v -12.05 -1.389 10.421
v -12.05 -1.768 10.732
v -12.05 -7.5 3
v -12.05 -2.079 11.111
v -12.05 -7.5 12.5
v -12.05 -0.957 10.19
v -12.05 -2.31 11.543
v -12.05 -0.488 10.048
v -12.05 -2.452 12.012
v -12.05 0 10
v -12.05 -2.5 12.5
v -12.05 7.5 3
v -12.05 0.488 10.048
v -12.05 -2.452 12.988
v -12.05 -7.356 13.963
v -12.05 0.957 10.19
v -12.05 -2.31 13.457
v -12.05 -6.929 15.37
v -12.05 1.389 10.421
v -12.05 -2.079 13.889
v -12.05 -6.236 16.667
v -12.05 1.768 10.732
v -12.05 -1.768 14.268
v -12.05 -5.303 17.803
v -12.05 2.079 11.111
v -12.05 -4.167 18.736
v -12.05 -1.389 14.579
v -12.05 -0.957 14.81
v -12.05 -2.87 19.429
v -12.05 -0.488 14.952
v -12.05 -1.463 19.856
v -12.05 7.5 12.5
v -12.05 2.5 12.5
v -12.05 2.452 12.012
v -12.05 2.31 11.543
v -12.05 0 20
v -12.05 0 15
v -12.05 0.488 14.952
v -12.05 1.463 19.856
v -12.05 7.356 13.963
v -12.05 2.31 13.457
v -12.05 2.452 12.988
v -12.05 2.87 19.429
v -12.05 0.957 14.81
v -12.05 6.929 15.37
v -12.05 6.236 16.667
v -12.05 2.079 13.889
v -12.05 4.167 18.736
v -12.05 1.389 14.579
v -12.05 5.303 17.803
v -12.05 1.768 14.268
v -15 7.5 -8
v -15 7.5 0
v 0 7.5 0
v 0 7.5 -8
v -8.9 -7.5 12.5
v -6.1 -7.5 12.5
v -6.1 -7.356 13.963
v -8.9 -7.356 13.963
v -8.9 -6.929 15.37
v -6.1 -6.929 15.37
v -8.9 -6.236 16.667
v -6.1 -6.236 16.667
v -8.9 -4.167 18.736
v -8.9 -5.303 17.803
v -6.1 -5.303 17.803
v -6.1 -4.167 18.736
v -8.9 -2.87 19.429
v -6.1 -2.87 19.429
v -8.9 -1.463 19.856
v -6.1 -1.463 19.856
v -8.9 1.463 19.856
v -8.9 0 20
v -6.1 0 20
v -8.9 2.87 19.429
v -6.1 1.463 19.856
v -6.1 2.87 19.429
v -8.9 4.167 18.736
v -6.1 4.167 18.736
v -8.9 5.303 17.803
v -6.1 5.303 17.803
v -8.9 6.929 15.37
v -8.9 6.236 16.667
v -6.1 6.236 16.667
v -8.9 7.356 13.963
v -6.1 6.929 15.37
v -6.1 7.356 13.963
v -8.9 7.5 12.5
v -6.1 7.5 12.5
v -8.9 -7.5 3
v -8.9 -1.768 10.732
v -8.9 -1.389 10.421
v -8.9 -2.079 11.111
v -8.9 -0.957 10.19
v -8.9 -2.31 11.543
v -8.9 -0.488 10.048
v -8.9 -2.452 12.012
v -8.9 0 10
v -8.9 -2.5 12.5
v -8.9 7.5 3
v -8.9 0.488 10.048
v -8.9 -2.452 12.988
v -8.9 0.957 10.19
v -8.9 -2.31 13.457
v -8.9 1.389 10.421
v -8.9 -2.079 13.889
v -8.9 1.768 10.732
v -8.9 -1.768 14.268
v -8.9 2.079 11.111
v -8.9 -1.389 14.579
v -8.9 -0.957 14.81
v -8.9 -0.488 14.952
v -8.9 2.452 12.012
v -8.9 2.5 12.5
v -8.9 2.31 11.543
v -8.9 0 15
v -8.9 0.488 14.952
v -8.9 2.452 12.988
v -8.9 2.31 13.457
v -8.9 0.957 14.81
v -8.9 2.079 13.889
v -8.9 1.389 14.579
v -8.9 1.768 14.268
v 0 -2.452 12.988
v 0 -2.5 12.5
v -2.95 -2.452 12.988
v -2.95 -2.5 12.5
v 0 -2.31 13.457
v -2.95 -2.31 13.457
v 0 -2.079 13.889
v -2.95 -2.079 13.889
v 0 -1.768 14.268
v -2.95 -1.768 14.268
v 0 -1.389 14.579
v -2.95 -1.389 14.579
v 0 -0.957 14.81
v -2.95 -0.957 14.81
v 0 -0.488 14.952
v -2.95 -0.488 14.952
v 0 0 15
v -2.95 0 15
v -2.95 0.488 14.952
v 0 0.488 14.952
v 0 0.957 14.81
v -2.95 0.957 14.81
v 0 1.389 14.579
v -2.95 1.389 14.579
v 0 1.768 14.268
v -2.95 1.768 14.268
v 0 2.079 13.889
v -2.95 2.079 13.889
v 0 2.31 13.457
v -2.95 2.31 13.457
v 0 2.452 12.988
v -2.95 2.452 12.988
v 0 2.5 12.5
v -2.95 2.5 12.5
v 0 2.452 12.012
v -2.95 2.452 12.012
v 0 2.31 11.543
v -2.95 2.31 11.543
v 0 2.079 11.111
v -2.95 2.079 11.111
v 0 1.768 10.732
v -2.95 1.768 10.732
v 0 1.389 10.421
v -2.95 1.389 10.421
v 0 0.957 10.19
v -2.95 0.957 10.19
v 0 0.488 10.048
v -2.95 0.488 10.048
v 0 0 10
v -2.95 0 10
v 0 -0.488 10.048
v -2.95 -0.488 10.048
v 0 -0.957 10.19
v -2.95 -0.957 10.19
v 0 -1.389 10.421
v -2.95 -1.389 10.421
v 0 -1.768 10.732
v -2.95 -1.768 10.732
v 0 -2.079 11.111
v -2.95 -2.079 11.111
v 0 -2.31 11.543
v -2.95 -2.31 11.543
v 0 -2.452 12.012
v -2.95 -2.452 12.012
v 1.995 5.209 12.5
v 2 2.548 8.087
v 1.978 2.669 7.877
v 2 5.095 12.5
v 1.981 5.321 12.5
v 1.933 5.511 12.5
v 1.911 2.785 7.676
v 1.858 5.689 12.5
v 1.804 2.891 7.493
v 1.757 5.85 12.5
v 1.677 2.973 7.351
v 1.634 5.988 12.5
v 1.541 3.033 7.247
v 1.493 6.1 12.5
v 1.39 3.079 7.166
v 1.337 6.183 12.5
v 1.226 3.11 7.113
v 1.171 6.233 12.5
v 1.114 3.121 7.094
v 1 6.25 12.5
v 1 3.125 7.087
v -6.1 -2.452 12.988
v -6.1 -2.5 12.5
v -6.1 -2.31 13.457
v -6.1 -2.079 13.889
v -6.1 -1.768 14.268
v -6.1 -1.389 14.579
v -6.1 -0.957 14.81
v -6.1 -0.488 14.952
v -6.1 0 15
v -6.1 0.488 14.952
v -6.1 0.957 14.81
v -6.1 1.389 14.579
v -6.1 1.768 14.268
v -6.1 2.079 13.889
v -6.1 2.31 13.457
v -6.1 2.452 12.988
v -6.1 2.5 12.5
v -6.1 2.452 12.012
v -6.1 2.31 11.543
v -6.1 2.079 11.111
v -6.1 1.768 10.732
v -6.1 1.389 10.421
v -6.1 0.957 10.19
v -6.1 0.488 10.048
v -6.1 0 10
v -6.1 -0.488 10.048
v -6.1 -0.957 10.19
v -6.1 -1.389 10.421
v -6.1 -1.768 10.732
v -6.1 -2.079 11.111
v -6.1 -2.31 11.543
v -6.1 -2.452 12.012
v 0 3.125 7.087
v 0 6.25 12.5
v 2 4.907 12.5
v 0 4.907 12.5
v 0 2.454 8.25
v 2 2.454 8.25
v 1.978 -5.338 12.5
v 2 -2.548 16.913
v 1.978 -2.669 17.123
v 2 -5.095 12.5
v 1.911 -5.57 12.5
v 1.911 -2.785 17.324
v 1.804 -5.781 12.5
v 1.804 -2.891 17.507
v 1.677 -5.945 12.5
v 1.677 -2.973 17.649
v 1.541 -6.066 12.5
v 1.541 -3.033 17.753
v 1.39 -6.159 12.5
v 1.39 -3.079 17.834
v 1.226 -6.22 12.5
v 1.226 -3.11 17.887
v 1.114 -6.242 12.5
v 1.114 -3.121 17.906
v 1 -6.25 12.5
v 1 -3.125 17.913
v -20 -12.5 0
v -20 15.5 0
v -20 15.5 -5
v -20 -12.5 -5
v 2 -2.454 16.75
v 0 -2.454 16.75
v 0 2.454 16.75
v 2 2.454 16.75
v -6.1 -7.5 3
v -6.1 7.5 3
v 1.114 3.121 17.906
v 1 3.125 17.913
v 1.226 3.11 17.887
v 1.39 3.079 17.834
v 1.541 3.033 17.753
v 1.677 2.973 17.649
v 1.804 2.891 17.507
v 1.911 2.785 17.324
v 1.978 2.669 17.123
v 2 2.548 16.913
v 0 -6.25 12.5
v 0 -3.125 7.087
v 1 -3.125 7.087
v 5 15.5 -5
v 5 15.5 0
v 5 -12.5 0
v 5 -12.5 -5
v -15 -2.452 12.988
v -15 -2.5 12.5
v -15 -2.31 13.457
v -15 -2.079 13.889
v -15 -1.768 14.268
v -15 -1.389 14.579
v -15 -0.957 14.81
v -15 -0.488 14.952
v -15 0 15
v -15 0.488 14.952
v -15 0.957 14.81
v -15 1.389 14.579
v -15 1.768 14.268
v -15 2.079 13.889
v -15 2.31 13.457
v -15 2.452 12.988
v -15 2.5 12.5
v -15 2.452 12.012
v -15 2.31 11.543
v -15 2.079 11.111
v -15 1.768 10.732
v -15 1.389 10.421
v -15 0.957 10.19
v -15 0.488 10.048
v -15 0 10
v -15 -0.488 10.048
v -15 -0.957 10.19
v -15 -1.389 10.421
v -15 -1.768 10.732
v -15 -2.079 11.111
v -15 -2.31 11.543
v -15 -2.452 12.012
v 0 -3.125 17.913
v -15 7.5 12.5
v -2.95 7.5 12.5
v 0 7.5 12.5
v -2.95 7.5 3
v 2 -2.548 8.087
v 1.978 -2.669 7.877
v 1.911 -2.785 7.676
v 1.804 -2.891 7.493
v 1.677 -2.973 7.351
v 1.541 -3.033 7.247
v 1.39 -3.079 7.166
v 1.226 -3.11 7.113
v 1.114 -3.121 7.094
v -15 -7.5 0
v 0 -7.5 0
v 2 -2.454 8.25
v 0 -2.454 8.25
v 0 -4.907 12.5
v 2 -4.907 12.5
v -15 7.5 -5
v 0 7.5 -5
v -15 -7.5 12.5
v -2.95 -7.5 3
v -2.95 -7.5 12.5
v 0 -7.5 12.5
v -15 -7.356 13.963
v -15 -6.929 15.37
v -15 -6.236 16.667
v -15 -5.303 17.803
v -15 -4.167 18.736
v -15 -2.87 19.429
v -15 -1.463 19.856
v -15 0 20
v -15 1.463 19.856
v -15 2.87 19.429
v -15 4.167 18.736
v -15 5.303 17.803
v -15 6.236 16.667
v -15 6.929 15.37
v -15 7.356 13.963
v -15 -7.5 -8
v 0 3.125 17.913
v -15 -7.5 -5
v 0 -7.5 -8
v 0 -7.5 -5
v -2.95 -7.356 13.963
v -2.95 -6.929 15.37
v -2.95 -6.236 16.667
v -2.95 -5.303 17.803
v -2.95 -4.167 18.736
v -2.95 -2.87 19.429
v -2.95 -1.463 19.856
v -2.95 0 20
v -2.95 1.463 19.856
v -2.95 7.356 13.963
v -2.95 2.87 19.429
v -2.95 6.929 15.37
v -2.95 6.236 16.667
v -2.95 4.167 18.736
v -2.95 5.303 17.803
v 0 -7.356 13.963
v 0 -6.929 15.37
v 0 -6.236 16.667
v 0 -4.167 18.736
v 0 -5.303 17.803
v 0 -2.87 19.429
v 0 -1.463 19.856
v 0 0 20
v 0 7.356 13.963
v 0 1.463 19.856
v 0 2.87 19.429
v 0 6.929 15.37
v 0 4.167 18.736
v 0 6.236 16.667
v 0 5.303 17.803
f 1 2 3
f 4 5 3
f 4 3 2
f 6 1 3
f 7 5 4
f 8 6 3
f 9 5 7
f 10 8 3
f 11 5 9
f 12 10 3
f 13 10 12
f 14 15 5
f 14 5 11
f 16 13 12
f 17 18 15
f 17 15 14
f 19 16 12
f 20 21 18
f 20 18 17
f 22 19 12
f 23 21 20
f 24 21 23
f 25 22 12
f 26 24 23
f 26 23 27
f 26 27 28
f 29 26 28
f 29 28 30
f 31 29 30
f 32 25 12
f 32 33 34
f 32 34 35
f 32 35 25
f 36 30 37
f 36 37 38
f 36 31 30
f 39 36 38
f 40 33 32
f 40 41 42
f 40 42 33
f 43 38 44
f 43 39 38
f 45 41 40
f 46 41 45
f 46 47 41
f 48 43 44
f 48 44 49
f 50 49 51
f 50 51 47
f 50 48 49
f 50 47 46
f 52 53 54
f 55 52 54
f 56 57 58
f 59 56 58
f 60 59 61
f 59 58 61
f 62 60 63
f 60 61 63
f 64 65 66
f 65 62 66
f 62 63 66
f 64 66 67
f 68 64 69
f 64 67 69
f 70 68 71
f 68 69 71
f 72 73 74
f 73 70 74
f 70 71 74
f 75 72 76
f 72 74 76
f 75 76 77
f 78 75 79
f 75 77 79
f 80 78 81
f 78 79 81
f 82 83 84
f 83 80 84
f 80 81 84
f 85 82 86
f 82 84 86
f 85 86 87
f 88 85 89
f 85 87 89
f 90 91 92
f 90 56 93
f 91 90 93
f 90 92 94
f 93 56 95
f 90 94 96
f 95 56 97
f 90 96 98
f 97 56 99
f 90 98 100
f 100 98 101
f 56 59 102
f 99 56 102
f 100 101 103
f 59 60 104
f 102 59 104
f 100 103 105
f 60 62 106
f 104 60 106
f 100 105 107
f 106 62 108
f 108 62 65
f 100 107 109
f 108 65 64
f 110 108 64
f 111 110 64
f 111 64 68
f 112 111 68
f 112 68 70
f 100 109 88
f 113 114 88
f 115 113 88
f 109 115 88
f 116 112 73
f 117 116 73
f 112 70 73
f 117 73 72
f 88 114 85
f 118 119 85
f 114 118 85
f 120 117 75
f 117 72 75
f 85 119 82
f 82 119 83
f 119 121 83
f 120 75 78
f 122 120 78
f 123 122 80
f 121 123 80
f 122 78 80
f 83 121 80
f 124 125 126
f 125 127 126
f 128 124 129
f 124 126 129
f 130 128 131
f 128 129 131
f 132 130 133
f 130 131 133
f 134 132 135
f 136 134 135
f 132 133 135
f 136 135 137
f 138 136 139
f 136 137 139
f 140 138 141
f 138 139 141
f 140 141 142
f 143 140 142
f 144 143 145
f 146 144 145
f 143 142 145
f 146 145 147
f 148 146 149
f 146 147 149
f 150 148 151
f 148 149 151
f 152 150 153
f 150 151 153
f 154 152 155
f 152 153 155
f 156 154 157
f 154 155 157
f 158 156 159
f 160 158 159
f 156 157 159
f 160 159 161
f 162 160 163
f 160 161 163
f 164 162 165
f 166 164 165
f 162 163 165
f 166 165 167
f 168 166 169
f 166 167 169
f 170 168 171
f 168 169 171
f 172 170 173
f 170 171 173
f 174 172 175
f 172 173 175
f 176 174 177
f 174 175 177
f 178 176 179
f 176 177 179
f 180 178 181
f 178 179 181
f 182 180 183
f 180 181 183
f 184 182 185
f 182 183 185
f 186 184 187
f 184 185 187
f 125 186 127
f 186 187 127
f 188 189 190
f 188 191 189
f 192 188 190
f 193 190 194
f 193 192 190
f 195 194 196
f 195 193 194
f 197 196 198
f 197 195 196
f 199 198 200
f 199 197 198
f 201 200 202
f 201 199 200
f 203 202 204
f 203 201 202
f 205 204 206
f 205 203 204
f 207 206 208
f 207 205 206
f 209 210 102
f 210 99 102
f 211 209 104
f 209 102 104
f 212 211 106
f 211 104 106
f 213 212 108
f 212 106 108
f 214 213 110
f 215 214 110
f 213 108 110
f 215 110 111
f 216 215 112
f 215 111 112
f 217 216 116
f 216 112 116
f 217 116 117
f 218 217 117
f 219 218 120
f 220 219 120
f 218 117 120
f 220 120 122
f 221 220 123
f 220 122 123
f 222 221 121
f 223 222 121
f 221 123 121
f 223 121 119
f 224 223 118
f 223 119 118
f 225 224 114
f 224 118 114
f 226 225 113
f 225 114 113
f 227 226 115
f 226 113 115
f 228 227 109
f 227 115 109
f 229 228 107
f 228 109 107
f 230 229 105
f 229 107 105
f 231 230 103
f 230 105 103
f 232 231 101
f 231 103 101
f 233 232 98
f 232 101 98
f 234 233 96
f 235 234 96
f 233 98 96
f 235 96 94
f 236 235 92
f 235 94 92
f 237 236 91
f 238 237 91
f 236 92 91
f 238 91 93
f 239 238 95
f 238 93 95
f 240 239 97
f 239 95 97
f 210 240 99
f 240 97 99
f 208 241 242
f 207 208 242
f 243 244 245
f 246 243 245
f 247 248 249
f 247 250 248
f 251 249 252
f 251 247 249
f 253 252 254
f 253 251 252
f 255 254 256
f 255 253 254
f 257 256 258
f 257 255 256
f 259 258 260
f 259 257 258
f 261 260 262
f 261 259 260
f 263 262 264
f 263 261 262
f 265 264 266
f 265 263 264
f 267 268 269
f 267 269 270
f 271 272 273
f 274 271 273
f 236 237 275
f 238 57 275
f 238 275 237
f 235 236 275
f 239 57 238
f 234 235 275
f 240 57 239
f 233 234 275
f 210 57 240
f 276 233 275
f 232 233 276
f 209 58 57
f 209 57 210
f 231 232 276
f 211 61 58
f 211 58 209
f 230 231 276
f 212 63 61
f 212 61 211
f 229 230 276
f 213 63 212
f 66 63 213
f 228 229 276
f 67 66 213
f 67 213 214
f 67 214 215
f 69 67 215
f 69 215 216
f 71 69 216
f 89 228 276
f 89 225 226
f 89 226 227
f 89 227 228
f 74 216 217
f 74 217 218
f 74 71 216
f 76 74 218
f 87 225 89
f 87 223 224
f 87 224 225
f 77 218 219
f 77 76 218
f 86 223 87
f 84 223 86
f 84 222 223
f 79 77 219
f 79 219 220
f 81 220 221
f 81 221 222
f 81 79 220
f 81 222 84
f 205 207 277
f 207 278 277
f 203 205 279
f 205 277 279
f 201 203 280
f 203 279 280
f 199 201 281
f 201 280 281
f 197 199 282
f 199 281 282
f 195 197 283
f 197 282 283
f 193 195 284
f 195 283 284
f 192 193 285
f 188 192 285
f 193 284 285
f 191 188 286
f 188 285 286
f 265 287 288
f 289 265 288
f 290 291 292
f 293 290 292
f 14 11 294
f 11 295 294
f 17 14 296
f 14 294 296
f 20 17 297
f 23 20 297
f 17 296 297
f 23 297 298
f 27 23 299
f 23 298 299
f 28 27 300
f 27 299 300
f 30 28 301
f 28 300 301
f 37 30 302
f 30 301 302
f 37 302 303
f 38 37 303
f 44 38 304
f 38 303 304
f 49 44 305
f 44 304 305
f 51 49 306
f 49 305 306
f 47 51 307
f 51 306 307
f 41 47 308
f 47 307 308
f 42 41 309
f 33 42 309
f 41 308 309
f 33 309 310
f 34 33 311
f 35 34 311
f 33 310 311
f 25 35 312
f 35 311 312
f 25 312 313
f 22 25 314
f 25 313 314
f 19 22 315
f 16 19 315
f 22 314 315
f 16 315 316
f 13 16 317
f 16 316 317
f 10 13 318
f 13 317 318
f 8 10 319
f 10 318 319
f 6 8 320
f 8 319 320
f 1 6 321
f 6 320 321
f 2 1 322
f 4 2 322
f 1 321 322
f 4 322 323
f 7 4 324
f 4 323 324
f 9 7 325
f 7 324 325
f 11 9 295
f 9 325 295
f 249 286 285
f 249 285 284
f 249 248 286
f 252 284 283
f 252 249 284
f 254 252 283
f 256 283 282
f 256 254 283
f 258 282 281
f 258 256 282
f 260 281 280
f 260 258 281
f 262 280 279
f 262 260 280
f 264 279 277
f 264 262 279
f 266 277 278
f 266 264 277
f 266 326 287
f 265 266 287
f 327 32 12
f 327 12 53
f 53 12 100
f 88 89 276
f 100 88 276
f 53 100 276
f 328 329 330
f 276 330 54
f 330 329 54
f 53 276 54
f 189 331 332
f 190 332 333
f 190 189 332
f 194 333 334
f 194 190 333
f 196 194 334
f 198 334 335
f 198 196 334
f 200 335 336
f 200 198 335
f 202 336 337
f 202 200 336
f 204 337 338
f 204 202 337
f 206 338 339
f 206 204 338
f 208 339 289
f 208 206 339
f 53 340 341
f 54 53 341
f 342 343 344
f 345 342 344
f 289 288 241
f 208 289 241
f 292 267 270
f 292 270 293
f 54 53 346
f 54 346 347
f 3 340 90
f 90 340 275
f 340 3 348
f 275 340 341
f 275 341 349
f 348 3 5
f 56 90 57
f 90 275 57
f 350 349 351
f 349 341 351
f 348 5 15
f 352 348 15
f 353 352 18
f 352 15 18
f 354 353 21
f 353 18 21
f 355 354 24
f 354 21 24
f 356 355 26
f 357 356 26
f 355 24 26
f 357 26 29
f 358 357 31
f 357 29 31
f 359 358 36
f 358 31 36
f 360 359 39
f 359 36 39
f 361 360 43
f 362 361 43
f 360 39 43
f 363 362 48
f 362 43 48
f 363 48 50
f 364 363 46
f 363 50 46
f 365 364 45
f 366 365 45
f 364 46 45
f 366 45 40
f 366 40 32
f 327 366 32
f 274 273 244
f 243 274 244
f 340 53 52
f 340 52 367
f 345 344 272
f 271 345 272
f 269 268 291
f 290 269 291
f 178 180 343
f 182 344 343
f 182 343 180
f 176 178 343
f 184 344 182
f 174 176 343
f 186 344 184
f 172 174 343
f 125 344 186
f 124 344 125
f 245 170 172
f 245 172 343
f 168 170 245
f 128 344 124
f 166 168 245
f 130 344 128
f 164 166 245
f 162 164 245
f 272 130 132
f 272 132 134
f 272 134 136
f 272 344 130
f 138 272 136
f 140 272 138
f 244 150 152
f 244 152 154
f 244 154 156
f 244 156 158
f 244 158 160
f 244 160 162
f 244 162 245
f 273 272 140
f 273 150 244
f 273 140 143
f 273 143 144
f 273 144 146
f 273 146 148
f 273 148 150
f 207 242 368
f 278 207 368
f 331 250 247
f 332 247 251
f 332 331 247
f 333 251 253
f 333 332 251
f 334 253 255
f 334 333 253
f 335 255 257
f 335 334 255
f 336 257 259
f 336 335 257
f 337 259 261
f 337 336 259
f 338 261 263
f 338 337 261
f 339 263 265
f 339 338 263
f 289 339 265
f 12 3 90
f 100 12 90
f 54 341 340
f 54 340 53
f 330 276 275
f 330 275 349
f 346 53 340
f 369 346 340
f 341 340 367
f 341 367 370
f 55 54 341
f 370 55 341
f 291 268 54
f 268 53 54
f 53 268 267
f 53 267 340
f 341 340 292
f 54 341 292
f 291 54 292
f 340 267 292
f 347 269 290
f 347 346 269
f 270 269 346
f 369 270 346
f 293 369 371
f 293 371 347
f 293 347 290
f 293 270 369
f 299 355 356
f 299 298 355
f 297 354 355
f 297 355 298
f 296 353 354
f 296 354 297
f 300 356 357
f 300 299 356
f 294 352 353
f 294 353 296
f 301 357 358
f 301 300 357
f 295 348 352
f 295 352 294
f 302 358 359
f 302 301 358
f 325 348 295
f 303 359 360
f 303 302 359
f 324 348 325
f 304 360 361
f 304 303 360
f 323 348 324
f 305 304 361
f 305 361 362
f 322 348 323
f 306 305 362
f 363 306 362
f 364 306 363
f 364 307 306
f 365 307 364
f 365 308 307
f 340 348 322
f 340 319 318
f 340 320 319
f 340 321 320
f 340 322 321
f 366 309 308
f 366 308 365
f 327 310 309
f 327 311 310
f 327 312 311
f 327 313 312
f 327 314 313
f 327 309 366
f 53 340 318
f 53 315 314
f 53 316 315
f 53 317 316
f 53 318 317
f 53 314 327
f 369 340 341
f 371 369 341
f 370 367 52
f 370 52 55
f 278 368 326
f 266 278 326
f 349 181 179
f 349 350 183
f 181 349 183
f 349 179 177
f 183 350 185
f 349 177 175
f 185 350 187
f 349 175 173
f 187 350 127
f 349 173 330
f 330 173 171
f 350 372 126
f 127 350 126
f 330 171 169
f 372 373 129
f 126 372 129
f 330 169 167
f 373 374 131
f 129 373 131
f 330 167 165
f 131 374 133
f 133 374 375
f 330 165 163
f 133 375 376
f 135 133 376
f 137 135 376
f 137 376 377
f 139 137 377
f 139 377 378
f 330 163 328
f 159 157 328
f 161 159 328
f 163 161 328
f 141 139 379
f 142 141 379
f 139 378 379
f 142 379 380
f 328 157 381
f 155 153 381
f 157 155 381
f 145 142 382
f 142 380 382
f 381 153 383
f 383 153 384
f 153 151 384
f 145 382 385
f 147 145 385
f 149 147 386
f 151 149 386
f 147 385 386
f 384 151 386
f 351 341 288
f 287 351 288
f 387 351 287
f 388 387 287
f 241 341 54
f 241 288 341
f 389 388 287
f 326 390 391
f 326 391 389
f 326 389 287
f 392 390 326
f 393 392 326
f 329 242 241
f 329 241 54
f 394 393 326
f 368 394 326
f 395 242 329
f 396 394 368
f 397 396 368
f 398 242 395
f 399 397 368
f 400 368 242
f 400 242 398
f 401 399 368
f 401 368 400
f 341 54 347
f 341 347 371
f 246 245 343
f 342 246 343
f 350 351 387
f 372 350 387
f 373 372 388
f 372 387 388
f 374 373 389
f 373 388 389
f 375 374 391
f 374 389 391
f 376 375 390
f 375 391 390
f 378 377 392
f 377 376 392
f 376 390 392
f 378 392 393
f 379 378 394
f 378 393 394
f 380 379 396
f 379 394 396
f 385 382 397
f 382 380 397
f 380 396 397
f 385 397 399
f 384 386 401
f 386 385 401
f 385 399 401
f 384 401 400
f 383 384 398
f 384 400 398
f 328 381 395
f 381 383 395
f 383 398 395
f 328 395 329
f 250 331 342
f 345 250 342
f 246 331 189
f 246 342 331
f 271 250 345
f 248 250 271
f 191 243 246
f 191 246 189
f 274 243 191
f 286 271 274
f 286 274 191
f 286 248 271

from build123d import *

# Parameters (mm, degrees)
F0_W      = 15
F0_H      = 3
F1_DEPTH  = 15
F2_DEPTH  = 3
F3_DEPTH  = 3
F4_DEPTH  = 2
F5_DEPTH  = 3
F6_DEPTH  = 12
F7_D      = 5
F7_DEPTH  = 15
F9_W      = 3.15
F9_H      = 15
F10_DEPTH = 17
F11_R     = 1
F12_W     = 25
F12_H     = 28
F12_W_2   = 15
F12_H_2   = 15
F13_DEPTH = 5
F1_FACE_W = 15
F1_FACE_H = 15
F14_DEPTH = 8


with BuildPart() as f1:
    # F0 (on Right) → F1 (new body)
    with BuildSketch(Plane.YZ):
        with Locations((0, 1.5)):
            Rectangle(F0_W, F0_H)
    extrude(amount=-F1_DEPTH)

    # F0 (on Right) → F2 (join)
    with BuildSketch(Plane.YZ):
        with BuildLine():
            Line((-7.5, 12.5), (-7.5, 3))
            Line((-7.5, 3), (7.5, 3))
            Line((7.5, 3), (7.5, 12.5))
            ThreePointArc((7.5, 12.5), (0, 20), (-7.5, 12.5))
        make_face()
        Polygon((-6.25, 12.5), (-3.125, 17.912659), (3.125, 17.912659), (6.25, 12.5), (3.125, 7.087341), (-3.125, 7.087341), align=None, mode=Mode.SUBTRACT)
    extrude(amount=-F2_DEPTH)

    # F0 (on Right) → F3 (join)
    with BuildSketch(Plane.YZ):
        Polygon((3.125, 17.912659), (-3.125, 17.912659), (-6.25, 12.5), (-3.125, 7.087341), (3.125, 7.087341), (6.25, 12.5), align=None)
        Polygon((-4.907477, 12.5), (-2.453739, 16.75), (2.453739, 16.75), (4.907477, 12.5), (2.453739, 8.25), (-2.453739, 8.25), align=None, mode=Mode.SUBTRACT)
    extrude(amount=-F3_DEPTH)

    # F0 (on Right) → F4 (join)
    with BuildSketch(Plane.YZ):
        Polygon((3.125, 17.912659), (-3.125, 17.912659), (-6.25, 12.5), (-3.125, 7.087341), (3.125, 7.087341), (6.25, 12.5), align=None)
        Polygon((-4.907477, 12.5), (-2.453739, 16.75), (2.453739, 16.75), (4.907477, 12.5), (2.453739, 8.25), (-2.453739, 8.25), align=None, mode=Mode.SUBTRACT)
    extrude(amount=F4_DEPTH)

    # F0 (on Right) → F5 (join)
    with BuildSketch(Plane.YZ):
        Polygon((2.453739, 16.75), (-2.453739, 16.75), (-4.907477, 12.5), (-2.453739, 8.25), (2.453739, 8.25), (4.907477, 12.5), align=None)
    extrude(amount=-F5_DEPTH)

    # F5_face (on face) → F6 (join)
    with BuildSketch(Plane(origin=(-3, 0, 10.786279), x_dir=(0, 1, 0), z_dir=(-1, 0, 0))):
        with BuildLine():
            Line((-7.5, 7.786279), (-7.5, -1.713721))
            ThreePointArc((-7.5, -1.713721), (0, -9.213721), (7.5, -1.713721))
            Line((7.5, -1.713721), (7.5, 7.786279))
            Line((7.5, 7.786279), (-7.5, 7.786279))
        make_face()
    extrude(amount=F6_DEPTH)

    # F7
    with Locations(Plane.YZ):
        with Locations((0, 12.5)):
            Hole(F7_D / 2, depth=F7_DEPTH)

    # F9 (on offset) → F10 (cut)
    with BuildSketch(Plane.XY.offset(20)):
        with Locations((-10.475, 0)):
            Rectangle(F9_W, F9_H)
        with Locations((-4.525, 0)):
            Rectangle(F9_W, F9_H)
    extrude(amount=-F10_DEPTH, mode=Mode.SUBTRACT)

    # F11
    f11_edges = [f1.edges().sort_by_distance(p)[0] for p in [
        (2, -4.6875, 9.793671),
        (2, 0, 7.087341),
        (2, -4.6875, 15.206329),
        (2, 0, 17.912659),
        (2, 4.6875, 15.206329),
        (2, 4.6875, 9.793671),
    ]]
    fillet(f11_edges, radius=F11_R)


with BuildPart() as f13:
    # F12 (on face) → F13 (new body)
    with BuildSketch(Plane(origin=(0, 0, 0), x_dir=(1, 0, 0), z_dir=(0, 0, -1))):
        with Locations((-7.5, -1.5)):
            Rectangle(F12_W, F12_H)
        with Locations((-7.5, 0)):
            Rectangle(F12_W_2, F12_H_2, mode=Mode.SUBTRACT)
    extrude(amount=F13_DEPTH)


with BuildPart() as f14:
    # F1_face (on face) → F14 (new body)
    with BuildSketch(Plane(origin=(-7.5, 0, 0), x_dir=(1, 0, 0), z_dir=(0, 0, -1))):
        Rectangle(F1_FACE_W, F1_FACE_H)
    extrude(amount=F14_DEPTH)


solid = Compound([f1.part, f13.part, f14.part])
